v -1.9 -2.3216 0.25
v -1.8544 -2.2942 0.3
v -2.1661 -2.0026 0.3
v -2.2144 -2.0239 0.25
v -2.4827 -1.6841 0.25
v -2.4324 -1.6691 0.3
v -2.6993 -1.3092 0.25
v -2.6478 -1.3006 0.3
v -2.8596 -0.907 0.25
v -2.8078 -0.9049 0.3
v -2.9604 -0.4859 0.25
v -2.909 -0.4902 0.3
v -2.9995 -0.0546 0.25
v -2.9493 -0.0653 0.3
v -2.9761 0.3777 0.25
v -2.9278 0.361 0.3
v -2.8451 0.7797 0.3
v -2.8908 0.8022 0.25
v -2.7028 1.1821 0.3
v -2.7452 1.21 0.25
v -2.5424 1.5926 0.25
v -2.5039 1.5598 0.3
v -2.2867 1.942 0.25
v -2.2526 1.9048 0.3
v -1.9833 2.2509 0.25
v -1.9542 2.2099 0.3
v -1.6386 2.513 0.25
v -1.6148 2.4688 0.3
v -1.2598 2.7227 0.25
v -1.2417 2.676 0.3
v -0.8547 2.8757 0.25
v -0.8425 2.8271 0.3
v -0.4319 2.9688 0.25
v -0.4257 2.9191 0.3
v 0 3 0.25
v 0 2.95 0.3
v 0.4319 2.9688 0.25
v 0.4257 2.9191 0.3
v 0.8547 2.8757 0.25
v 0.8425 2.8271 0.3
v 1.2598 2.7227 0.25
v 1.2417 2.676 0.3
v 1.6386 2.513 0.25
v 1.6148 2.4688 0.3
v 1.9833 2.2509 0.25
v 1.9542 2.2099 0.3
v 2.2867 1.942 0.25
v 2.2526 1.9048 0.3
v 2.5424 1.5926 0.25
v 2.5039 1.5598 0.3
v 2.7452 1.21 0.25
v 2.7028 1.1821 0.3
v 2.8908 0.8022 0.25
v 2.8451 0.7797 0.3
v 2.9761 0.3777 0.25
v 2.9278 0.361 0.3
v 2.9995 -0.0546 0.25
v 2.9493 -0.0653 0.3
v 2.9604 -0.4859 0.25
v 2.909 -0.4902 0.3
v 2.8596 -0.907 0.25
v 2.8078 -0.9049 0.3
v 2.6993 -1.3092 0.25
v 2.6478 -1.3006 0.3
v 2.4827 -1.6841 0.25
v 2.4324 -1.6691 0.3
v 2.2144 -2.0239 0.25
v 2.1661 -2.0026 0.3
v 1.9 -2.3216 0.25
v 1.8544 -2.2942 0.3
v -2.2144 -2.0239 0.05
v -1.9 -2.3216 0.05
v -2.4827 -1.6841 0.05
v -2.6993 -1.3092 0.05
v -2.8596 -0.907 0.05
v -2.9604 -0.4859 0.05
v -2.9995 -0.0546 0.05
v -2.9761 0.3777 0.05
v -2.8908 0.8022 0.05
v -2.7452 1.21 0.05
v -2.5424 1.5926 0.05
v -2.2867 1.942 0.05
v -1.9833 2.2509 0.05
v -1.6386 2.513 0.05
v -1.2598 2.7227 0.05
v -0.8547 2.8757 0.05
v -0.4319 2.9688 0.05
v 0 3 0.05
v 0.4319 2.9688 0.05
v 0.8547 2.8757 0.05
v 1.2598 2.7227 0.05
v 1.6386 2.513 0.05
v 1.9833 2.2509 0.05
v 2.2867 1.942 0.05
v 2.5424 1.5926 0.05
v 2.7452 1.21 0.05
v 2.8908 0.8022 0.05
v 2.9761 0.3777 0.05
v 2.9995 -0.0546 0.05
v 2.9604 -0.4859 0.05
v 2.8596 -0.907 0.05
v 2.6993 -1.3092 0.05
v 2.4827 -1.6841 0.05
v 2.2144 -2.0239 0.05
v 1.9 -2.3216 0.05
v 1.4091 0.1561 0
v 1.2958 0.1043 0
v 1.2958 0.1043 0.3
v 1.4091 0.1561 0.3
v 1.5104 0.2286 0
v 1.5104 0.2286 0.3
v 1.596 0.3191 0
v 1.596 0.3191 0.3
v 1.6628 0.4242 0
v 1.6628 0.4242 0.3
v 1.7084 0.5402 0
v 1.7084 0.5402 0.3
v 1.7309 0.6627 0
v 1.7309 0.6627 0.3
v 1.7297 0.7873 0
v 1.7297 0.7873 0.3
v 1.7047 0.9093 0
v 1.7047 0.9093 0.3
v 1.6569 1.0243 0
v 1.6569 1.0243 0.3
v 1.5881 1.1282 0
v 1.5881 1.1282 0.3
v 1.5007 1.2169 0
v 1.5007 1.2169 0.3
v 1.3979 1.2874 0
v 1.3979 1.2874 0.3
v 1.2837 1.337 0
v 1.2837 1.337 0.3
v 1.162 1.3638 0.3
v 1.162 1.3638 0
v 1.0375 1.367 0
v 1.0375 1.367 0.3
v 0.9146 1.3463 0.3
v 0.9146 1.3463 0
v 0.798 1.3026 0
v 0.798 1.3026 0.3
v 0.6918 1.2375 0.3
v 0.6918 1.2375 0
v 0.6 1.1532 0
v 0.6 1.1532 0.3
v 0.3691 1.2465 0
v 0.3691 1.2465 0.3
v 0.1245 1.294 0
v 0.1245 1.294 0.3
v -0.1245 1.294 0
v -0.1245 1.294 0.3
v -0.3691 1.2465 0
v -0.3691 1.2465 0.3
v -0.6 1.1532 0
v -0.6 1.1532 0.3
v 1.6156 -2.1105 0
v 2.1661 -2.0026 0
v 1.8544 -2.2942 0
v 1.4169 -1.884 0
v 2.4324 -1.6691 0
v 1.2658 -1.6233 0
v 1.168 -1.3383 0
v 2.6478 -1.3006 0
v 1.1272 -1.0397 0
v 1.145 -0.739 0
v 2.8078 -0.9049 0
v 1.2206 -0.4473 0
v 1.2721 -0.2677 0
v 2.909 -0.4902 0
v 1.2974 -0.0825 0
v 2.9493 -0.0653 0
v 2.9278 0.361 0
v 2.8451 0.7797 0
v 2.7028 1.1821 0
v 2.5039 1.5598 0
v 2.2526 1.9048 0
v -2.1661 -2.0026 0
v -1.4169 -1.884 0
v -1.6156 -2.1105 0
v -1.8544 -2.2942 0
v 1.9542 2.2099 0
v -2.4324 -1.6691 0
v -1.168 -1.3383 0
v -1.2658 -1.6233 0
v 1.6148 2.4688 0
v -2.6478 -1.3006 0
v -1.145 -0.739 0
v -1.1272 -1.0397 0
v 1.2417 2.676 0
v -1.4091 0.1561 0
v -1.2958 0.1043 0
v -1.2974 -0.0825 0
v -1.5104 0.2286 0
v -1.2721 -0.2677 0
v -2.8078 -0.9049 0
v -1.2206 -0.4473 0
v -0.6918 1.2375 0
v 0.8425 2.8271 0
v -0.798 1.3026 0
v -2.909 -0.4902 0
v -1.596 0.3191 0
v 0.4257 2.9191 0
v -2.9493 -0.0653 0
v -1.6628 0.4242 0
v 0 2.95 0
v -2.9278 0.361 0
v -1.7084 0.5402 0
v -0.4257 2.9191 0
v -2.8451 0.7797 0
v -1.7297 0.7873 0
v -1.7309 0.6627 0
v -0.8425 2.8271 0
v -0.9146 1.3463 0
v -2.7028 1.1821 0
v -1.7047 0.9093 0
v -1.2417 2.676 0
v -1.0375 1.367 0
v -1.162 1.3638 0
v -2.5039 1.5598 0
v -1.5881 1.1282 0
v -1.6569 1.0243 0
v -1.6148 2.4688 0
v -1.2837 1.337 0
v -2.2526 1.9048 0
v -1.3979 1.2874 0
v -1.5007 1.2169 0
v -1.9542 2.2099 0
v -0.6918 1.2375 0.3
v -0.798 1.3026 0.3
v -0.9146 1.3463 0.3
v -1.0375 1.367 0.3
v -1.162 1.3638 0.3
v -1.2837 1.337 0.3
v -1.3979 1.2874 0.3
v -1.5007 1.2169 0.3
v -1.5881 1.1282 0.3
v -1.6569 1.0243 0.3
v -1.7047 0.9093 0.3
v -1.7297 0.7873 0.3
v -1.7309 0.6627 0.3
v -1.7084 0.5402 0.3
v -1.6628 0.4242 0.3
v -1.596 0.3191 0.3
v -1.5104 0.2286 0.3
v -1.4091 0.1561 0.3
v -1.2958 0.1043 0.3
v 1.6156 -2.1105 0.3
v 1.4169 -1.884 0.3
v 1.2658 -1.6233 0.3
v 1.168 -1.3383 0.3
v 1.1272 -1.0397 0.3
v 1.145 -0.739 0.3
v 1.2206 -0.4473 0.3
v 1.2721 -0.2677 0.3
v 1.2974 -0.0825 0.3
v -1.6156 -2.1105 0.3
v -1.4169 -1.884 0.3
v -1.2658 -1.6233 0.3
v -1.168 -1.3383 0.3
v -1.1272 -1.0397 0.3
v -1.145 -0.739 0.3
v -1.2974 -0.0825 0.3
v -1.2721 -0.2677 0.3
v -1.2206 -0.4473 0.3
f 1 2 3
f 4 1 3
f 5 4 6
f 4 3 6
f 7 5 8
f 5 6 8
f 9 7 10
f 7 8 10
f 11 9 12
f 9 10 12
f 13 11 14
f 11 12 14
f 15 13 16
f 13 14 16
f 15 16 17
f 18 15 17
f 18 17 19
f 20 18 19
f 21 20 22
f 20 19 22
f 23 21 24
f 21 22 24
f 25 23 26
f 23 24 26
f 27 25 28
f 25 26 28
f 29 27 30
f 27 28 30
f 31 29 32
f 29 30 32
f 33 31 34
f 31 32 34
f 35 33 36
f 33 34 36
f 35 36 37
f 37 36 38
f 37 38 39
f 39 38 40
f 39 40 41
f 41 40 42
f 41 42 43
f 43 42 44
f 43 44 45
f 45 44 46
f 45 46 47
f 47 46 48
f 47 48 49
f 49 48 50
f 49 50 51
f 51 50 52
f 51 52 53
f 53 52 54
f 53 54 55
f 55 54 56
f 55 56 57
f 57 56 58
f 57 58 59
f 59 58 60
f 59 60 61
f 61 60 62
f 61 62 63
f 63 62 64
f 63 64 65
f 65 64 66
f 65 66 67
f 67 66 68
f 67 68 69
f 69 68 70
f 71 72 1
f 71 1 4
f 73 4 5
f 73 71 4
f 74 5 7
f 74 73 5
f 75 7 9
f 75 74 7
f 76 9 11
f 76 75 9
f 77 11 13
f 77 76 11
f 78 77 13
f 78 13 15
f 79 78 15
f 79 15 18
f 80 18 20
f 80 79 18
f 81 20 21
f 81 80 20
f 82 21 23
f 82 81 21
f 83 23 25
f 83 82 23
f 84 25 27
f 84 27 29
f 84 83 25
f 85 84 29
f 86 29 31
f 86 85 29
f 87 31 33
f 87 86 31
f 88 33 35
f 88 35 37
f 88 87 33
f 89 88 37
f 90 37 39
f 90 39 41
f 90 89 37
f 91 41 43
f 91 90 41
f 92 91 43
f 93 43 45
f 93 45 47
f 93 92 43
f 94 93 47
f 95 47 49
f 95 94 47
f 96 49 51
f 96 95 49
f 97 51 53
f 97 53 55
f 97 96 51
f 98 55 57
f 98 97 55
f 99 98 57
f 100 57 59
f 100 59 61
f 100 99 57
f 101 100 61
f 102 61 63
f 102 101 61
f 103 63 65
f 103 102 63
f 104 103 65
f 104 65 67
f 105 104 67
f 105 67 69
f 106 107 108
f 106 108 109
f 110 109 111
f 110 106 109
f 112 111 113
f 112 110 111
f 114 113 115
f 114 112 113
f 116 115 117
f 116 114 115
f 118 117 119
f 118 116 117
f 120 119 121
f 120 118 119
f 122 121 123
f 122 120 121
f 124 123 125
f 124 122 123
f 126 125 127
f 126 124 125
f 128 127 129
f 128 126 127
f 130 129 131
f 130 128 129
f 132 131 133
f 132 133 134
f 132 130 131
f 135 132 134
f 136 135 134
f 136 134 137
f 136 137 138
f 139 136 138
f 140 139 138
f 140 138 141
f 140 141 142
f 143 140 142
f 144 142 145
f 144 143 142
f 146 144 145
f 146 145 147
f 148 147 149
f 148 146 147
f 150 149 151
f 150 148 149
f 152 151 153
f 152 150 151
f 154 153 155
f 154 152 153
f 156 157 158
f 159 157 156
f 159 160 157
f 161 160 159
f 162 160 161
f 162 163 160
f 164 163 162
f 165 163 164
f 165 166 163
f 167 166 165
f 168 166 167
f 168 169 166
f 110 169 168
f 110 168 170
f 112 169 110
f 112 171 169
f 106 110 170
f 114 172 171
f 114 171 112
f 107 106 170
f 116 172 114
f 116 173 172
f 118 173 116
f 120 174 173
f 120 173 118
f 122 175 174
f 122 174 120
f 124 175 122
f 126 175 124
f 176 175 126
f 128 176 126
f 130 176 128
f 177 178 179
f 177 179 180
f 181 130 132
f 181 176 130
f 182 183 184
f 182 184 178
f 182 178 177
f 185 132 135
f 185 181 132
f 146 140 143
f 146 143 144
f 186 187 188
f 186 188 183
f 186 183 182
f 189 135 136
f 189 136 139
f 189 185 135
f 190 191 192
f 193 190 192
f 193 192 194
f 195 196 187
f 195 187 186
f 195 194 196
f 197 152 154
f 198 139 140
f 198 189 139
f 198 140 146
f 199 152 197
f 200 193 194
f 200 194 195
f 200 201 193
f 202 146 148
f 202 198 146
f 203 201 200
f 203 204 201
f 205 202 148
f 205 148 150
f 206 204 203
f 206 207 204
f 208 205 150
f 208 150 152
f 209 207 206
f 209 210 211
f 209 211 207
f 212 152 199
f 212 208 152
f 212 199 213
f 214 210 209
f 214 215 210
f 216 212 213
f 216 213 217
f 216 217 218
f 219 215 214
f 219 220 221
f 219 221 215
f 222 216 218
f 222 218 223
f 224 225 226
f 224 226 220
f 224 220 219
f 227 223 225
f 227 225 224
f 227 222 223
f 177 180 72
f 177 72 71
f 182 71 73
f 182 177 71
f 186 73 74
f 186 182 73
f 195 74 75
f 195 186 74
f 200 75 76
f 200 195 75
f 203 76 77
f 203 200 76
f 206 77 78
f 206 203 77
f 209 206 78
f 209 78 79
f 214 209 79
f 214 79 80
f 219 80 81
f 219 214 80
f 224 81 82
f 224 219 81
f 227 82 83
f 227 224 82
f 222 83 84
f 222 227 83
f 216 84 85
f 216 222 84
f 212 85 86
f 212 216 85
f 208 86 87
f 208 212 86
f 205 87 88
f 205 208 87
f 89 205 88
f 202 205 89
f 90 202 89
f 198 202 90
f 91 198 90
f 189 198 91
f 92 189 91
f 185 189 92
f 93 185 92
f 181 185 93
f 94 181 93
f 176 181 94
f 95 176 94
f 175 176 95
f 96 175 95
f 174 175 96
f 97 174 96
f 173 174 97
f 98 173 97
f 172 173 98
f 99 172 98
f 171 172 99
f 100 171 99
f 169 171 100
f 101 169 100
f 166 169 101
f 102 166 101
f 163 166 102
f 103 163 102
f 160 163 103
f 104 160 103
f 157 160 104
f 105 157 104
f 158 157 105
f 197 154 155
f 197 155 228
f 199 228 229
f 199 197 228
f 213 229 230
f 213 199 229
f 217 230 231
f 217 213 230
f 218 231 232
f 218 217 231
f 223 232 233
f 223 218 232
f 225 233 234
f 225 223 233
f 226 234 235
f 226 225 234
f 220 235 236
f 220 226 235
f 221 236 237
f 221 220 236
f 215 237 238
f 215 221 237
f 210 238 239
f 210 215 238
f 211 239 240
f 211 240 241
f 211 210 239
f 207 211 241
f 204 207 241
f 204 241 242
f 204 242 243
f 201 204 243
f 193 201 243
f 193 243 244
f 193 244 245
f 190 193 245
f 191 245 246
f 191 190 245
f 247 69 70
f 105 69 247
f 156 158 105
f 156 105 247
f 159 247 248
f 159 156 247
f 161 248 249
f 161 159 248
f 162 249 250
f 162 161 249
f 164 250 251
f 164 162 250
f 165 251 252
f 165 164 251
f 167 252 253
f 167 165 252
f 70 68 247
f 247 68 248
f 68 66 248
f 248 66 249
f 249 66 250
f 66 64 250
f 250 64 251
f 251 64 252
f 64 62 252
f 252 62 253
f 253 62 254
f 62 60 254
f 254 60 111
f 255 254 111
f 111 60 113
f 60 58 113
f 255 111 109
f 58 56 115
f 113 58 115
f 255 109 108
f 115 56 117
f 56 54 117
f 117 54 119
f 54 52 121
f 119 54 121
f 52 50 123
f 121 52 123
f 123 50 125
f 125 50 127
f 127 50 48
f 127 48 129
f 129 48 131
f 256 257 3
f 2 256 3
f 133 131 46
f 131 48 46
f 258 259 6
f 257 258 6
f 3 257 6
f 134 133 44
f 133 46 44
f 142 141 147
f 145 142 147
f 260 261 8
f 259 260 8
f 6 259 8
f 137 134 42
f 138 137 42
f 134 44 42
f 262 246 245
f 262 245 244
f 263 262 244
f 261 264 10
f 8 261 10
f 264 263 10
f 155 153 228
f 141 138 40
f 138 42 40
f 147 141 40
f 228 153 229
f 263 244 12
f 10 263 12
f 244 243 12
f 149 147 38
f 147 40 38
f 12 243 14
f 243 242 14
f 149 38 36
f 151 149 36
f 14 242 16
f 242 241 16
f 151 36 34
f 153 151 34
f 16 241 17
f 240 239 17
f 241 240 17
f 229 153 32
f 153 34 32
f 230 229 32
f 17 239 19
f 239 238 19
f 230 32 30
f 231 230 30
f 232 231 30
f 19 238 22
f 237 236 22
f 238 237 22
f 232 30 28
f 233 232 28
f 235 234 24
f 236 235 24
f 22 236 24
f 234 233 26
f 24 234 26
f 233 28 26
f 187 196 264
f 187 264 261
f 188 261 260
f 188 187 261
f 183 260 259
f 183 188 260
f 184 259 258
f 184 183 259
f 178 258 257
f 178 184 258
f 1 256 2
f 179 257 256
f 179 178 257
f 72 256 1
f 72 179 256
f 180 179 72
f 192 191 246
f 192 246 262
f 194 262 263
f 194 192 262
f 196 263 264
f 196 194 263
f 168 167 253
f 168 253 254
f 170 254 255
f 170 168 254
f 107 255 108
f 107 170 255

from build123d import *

# Parameters (mm, degrees)
EXTRUDE_1_DEPTH = 0.3
CHAMFER_1_SIZE  = 0.05


with BuildPart() as part:
    # 草图1 → 凸台-拉伸1 (new body)
    with BuildSketch(Plane.XY):
        with BuildLine():
            ThreePointArc((-1.295808382, 0.104310288), (-1.288091369, -0.175558041), (-1.220629908, -0.44728361))
            ThreePointArc((-1.220629908, -0.44728361), (-1.21876562, -1.508256965), (-1.9, -2.321637353))
            ThreePointArc((-1.9, -2.321637353), (0, 3), (1.9, -2.321637353))
            ThreePointArc((1.9, -2.321637353), (1.21876562, -1.508256965), (1.220629908, -0.44728361))
            ThreePointArc((1.220629908, -0.44728361), (1.288091369, -0.175558041), (1.295808382, 0.104310288))
            ThreePointArc((1.295808382, 0.104310288), (1.625, 1.077903057), (0.600024951, 1.153243278))
            ThreePointArc((0.600024951, 1.153243278), (0, 1.3), (-0.600024951, 1.153243278))
            ThreePointArc((-0.600024951, 1.153243278), (-1.625, 1.077903057), (-1.295808382, 0.104310288))
        make_face()
    extrude(amount=EXTRUDE_1_DEPTH)

    # 倒角1
    chamfer_1_edges = [part.edges().sort_by_distance(p)[0] for p in [
        (0, 3, 0.3),
        (0, 3, 0),
    ]]
    chamfer(chamfer_1_edges, length=CHAMFER_1_SIZE)


solid = part.part
